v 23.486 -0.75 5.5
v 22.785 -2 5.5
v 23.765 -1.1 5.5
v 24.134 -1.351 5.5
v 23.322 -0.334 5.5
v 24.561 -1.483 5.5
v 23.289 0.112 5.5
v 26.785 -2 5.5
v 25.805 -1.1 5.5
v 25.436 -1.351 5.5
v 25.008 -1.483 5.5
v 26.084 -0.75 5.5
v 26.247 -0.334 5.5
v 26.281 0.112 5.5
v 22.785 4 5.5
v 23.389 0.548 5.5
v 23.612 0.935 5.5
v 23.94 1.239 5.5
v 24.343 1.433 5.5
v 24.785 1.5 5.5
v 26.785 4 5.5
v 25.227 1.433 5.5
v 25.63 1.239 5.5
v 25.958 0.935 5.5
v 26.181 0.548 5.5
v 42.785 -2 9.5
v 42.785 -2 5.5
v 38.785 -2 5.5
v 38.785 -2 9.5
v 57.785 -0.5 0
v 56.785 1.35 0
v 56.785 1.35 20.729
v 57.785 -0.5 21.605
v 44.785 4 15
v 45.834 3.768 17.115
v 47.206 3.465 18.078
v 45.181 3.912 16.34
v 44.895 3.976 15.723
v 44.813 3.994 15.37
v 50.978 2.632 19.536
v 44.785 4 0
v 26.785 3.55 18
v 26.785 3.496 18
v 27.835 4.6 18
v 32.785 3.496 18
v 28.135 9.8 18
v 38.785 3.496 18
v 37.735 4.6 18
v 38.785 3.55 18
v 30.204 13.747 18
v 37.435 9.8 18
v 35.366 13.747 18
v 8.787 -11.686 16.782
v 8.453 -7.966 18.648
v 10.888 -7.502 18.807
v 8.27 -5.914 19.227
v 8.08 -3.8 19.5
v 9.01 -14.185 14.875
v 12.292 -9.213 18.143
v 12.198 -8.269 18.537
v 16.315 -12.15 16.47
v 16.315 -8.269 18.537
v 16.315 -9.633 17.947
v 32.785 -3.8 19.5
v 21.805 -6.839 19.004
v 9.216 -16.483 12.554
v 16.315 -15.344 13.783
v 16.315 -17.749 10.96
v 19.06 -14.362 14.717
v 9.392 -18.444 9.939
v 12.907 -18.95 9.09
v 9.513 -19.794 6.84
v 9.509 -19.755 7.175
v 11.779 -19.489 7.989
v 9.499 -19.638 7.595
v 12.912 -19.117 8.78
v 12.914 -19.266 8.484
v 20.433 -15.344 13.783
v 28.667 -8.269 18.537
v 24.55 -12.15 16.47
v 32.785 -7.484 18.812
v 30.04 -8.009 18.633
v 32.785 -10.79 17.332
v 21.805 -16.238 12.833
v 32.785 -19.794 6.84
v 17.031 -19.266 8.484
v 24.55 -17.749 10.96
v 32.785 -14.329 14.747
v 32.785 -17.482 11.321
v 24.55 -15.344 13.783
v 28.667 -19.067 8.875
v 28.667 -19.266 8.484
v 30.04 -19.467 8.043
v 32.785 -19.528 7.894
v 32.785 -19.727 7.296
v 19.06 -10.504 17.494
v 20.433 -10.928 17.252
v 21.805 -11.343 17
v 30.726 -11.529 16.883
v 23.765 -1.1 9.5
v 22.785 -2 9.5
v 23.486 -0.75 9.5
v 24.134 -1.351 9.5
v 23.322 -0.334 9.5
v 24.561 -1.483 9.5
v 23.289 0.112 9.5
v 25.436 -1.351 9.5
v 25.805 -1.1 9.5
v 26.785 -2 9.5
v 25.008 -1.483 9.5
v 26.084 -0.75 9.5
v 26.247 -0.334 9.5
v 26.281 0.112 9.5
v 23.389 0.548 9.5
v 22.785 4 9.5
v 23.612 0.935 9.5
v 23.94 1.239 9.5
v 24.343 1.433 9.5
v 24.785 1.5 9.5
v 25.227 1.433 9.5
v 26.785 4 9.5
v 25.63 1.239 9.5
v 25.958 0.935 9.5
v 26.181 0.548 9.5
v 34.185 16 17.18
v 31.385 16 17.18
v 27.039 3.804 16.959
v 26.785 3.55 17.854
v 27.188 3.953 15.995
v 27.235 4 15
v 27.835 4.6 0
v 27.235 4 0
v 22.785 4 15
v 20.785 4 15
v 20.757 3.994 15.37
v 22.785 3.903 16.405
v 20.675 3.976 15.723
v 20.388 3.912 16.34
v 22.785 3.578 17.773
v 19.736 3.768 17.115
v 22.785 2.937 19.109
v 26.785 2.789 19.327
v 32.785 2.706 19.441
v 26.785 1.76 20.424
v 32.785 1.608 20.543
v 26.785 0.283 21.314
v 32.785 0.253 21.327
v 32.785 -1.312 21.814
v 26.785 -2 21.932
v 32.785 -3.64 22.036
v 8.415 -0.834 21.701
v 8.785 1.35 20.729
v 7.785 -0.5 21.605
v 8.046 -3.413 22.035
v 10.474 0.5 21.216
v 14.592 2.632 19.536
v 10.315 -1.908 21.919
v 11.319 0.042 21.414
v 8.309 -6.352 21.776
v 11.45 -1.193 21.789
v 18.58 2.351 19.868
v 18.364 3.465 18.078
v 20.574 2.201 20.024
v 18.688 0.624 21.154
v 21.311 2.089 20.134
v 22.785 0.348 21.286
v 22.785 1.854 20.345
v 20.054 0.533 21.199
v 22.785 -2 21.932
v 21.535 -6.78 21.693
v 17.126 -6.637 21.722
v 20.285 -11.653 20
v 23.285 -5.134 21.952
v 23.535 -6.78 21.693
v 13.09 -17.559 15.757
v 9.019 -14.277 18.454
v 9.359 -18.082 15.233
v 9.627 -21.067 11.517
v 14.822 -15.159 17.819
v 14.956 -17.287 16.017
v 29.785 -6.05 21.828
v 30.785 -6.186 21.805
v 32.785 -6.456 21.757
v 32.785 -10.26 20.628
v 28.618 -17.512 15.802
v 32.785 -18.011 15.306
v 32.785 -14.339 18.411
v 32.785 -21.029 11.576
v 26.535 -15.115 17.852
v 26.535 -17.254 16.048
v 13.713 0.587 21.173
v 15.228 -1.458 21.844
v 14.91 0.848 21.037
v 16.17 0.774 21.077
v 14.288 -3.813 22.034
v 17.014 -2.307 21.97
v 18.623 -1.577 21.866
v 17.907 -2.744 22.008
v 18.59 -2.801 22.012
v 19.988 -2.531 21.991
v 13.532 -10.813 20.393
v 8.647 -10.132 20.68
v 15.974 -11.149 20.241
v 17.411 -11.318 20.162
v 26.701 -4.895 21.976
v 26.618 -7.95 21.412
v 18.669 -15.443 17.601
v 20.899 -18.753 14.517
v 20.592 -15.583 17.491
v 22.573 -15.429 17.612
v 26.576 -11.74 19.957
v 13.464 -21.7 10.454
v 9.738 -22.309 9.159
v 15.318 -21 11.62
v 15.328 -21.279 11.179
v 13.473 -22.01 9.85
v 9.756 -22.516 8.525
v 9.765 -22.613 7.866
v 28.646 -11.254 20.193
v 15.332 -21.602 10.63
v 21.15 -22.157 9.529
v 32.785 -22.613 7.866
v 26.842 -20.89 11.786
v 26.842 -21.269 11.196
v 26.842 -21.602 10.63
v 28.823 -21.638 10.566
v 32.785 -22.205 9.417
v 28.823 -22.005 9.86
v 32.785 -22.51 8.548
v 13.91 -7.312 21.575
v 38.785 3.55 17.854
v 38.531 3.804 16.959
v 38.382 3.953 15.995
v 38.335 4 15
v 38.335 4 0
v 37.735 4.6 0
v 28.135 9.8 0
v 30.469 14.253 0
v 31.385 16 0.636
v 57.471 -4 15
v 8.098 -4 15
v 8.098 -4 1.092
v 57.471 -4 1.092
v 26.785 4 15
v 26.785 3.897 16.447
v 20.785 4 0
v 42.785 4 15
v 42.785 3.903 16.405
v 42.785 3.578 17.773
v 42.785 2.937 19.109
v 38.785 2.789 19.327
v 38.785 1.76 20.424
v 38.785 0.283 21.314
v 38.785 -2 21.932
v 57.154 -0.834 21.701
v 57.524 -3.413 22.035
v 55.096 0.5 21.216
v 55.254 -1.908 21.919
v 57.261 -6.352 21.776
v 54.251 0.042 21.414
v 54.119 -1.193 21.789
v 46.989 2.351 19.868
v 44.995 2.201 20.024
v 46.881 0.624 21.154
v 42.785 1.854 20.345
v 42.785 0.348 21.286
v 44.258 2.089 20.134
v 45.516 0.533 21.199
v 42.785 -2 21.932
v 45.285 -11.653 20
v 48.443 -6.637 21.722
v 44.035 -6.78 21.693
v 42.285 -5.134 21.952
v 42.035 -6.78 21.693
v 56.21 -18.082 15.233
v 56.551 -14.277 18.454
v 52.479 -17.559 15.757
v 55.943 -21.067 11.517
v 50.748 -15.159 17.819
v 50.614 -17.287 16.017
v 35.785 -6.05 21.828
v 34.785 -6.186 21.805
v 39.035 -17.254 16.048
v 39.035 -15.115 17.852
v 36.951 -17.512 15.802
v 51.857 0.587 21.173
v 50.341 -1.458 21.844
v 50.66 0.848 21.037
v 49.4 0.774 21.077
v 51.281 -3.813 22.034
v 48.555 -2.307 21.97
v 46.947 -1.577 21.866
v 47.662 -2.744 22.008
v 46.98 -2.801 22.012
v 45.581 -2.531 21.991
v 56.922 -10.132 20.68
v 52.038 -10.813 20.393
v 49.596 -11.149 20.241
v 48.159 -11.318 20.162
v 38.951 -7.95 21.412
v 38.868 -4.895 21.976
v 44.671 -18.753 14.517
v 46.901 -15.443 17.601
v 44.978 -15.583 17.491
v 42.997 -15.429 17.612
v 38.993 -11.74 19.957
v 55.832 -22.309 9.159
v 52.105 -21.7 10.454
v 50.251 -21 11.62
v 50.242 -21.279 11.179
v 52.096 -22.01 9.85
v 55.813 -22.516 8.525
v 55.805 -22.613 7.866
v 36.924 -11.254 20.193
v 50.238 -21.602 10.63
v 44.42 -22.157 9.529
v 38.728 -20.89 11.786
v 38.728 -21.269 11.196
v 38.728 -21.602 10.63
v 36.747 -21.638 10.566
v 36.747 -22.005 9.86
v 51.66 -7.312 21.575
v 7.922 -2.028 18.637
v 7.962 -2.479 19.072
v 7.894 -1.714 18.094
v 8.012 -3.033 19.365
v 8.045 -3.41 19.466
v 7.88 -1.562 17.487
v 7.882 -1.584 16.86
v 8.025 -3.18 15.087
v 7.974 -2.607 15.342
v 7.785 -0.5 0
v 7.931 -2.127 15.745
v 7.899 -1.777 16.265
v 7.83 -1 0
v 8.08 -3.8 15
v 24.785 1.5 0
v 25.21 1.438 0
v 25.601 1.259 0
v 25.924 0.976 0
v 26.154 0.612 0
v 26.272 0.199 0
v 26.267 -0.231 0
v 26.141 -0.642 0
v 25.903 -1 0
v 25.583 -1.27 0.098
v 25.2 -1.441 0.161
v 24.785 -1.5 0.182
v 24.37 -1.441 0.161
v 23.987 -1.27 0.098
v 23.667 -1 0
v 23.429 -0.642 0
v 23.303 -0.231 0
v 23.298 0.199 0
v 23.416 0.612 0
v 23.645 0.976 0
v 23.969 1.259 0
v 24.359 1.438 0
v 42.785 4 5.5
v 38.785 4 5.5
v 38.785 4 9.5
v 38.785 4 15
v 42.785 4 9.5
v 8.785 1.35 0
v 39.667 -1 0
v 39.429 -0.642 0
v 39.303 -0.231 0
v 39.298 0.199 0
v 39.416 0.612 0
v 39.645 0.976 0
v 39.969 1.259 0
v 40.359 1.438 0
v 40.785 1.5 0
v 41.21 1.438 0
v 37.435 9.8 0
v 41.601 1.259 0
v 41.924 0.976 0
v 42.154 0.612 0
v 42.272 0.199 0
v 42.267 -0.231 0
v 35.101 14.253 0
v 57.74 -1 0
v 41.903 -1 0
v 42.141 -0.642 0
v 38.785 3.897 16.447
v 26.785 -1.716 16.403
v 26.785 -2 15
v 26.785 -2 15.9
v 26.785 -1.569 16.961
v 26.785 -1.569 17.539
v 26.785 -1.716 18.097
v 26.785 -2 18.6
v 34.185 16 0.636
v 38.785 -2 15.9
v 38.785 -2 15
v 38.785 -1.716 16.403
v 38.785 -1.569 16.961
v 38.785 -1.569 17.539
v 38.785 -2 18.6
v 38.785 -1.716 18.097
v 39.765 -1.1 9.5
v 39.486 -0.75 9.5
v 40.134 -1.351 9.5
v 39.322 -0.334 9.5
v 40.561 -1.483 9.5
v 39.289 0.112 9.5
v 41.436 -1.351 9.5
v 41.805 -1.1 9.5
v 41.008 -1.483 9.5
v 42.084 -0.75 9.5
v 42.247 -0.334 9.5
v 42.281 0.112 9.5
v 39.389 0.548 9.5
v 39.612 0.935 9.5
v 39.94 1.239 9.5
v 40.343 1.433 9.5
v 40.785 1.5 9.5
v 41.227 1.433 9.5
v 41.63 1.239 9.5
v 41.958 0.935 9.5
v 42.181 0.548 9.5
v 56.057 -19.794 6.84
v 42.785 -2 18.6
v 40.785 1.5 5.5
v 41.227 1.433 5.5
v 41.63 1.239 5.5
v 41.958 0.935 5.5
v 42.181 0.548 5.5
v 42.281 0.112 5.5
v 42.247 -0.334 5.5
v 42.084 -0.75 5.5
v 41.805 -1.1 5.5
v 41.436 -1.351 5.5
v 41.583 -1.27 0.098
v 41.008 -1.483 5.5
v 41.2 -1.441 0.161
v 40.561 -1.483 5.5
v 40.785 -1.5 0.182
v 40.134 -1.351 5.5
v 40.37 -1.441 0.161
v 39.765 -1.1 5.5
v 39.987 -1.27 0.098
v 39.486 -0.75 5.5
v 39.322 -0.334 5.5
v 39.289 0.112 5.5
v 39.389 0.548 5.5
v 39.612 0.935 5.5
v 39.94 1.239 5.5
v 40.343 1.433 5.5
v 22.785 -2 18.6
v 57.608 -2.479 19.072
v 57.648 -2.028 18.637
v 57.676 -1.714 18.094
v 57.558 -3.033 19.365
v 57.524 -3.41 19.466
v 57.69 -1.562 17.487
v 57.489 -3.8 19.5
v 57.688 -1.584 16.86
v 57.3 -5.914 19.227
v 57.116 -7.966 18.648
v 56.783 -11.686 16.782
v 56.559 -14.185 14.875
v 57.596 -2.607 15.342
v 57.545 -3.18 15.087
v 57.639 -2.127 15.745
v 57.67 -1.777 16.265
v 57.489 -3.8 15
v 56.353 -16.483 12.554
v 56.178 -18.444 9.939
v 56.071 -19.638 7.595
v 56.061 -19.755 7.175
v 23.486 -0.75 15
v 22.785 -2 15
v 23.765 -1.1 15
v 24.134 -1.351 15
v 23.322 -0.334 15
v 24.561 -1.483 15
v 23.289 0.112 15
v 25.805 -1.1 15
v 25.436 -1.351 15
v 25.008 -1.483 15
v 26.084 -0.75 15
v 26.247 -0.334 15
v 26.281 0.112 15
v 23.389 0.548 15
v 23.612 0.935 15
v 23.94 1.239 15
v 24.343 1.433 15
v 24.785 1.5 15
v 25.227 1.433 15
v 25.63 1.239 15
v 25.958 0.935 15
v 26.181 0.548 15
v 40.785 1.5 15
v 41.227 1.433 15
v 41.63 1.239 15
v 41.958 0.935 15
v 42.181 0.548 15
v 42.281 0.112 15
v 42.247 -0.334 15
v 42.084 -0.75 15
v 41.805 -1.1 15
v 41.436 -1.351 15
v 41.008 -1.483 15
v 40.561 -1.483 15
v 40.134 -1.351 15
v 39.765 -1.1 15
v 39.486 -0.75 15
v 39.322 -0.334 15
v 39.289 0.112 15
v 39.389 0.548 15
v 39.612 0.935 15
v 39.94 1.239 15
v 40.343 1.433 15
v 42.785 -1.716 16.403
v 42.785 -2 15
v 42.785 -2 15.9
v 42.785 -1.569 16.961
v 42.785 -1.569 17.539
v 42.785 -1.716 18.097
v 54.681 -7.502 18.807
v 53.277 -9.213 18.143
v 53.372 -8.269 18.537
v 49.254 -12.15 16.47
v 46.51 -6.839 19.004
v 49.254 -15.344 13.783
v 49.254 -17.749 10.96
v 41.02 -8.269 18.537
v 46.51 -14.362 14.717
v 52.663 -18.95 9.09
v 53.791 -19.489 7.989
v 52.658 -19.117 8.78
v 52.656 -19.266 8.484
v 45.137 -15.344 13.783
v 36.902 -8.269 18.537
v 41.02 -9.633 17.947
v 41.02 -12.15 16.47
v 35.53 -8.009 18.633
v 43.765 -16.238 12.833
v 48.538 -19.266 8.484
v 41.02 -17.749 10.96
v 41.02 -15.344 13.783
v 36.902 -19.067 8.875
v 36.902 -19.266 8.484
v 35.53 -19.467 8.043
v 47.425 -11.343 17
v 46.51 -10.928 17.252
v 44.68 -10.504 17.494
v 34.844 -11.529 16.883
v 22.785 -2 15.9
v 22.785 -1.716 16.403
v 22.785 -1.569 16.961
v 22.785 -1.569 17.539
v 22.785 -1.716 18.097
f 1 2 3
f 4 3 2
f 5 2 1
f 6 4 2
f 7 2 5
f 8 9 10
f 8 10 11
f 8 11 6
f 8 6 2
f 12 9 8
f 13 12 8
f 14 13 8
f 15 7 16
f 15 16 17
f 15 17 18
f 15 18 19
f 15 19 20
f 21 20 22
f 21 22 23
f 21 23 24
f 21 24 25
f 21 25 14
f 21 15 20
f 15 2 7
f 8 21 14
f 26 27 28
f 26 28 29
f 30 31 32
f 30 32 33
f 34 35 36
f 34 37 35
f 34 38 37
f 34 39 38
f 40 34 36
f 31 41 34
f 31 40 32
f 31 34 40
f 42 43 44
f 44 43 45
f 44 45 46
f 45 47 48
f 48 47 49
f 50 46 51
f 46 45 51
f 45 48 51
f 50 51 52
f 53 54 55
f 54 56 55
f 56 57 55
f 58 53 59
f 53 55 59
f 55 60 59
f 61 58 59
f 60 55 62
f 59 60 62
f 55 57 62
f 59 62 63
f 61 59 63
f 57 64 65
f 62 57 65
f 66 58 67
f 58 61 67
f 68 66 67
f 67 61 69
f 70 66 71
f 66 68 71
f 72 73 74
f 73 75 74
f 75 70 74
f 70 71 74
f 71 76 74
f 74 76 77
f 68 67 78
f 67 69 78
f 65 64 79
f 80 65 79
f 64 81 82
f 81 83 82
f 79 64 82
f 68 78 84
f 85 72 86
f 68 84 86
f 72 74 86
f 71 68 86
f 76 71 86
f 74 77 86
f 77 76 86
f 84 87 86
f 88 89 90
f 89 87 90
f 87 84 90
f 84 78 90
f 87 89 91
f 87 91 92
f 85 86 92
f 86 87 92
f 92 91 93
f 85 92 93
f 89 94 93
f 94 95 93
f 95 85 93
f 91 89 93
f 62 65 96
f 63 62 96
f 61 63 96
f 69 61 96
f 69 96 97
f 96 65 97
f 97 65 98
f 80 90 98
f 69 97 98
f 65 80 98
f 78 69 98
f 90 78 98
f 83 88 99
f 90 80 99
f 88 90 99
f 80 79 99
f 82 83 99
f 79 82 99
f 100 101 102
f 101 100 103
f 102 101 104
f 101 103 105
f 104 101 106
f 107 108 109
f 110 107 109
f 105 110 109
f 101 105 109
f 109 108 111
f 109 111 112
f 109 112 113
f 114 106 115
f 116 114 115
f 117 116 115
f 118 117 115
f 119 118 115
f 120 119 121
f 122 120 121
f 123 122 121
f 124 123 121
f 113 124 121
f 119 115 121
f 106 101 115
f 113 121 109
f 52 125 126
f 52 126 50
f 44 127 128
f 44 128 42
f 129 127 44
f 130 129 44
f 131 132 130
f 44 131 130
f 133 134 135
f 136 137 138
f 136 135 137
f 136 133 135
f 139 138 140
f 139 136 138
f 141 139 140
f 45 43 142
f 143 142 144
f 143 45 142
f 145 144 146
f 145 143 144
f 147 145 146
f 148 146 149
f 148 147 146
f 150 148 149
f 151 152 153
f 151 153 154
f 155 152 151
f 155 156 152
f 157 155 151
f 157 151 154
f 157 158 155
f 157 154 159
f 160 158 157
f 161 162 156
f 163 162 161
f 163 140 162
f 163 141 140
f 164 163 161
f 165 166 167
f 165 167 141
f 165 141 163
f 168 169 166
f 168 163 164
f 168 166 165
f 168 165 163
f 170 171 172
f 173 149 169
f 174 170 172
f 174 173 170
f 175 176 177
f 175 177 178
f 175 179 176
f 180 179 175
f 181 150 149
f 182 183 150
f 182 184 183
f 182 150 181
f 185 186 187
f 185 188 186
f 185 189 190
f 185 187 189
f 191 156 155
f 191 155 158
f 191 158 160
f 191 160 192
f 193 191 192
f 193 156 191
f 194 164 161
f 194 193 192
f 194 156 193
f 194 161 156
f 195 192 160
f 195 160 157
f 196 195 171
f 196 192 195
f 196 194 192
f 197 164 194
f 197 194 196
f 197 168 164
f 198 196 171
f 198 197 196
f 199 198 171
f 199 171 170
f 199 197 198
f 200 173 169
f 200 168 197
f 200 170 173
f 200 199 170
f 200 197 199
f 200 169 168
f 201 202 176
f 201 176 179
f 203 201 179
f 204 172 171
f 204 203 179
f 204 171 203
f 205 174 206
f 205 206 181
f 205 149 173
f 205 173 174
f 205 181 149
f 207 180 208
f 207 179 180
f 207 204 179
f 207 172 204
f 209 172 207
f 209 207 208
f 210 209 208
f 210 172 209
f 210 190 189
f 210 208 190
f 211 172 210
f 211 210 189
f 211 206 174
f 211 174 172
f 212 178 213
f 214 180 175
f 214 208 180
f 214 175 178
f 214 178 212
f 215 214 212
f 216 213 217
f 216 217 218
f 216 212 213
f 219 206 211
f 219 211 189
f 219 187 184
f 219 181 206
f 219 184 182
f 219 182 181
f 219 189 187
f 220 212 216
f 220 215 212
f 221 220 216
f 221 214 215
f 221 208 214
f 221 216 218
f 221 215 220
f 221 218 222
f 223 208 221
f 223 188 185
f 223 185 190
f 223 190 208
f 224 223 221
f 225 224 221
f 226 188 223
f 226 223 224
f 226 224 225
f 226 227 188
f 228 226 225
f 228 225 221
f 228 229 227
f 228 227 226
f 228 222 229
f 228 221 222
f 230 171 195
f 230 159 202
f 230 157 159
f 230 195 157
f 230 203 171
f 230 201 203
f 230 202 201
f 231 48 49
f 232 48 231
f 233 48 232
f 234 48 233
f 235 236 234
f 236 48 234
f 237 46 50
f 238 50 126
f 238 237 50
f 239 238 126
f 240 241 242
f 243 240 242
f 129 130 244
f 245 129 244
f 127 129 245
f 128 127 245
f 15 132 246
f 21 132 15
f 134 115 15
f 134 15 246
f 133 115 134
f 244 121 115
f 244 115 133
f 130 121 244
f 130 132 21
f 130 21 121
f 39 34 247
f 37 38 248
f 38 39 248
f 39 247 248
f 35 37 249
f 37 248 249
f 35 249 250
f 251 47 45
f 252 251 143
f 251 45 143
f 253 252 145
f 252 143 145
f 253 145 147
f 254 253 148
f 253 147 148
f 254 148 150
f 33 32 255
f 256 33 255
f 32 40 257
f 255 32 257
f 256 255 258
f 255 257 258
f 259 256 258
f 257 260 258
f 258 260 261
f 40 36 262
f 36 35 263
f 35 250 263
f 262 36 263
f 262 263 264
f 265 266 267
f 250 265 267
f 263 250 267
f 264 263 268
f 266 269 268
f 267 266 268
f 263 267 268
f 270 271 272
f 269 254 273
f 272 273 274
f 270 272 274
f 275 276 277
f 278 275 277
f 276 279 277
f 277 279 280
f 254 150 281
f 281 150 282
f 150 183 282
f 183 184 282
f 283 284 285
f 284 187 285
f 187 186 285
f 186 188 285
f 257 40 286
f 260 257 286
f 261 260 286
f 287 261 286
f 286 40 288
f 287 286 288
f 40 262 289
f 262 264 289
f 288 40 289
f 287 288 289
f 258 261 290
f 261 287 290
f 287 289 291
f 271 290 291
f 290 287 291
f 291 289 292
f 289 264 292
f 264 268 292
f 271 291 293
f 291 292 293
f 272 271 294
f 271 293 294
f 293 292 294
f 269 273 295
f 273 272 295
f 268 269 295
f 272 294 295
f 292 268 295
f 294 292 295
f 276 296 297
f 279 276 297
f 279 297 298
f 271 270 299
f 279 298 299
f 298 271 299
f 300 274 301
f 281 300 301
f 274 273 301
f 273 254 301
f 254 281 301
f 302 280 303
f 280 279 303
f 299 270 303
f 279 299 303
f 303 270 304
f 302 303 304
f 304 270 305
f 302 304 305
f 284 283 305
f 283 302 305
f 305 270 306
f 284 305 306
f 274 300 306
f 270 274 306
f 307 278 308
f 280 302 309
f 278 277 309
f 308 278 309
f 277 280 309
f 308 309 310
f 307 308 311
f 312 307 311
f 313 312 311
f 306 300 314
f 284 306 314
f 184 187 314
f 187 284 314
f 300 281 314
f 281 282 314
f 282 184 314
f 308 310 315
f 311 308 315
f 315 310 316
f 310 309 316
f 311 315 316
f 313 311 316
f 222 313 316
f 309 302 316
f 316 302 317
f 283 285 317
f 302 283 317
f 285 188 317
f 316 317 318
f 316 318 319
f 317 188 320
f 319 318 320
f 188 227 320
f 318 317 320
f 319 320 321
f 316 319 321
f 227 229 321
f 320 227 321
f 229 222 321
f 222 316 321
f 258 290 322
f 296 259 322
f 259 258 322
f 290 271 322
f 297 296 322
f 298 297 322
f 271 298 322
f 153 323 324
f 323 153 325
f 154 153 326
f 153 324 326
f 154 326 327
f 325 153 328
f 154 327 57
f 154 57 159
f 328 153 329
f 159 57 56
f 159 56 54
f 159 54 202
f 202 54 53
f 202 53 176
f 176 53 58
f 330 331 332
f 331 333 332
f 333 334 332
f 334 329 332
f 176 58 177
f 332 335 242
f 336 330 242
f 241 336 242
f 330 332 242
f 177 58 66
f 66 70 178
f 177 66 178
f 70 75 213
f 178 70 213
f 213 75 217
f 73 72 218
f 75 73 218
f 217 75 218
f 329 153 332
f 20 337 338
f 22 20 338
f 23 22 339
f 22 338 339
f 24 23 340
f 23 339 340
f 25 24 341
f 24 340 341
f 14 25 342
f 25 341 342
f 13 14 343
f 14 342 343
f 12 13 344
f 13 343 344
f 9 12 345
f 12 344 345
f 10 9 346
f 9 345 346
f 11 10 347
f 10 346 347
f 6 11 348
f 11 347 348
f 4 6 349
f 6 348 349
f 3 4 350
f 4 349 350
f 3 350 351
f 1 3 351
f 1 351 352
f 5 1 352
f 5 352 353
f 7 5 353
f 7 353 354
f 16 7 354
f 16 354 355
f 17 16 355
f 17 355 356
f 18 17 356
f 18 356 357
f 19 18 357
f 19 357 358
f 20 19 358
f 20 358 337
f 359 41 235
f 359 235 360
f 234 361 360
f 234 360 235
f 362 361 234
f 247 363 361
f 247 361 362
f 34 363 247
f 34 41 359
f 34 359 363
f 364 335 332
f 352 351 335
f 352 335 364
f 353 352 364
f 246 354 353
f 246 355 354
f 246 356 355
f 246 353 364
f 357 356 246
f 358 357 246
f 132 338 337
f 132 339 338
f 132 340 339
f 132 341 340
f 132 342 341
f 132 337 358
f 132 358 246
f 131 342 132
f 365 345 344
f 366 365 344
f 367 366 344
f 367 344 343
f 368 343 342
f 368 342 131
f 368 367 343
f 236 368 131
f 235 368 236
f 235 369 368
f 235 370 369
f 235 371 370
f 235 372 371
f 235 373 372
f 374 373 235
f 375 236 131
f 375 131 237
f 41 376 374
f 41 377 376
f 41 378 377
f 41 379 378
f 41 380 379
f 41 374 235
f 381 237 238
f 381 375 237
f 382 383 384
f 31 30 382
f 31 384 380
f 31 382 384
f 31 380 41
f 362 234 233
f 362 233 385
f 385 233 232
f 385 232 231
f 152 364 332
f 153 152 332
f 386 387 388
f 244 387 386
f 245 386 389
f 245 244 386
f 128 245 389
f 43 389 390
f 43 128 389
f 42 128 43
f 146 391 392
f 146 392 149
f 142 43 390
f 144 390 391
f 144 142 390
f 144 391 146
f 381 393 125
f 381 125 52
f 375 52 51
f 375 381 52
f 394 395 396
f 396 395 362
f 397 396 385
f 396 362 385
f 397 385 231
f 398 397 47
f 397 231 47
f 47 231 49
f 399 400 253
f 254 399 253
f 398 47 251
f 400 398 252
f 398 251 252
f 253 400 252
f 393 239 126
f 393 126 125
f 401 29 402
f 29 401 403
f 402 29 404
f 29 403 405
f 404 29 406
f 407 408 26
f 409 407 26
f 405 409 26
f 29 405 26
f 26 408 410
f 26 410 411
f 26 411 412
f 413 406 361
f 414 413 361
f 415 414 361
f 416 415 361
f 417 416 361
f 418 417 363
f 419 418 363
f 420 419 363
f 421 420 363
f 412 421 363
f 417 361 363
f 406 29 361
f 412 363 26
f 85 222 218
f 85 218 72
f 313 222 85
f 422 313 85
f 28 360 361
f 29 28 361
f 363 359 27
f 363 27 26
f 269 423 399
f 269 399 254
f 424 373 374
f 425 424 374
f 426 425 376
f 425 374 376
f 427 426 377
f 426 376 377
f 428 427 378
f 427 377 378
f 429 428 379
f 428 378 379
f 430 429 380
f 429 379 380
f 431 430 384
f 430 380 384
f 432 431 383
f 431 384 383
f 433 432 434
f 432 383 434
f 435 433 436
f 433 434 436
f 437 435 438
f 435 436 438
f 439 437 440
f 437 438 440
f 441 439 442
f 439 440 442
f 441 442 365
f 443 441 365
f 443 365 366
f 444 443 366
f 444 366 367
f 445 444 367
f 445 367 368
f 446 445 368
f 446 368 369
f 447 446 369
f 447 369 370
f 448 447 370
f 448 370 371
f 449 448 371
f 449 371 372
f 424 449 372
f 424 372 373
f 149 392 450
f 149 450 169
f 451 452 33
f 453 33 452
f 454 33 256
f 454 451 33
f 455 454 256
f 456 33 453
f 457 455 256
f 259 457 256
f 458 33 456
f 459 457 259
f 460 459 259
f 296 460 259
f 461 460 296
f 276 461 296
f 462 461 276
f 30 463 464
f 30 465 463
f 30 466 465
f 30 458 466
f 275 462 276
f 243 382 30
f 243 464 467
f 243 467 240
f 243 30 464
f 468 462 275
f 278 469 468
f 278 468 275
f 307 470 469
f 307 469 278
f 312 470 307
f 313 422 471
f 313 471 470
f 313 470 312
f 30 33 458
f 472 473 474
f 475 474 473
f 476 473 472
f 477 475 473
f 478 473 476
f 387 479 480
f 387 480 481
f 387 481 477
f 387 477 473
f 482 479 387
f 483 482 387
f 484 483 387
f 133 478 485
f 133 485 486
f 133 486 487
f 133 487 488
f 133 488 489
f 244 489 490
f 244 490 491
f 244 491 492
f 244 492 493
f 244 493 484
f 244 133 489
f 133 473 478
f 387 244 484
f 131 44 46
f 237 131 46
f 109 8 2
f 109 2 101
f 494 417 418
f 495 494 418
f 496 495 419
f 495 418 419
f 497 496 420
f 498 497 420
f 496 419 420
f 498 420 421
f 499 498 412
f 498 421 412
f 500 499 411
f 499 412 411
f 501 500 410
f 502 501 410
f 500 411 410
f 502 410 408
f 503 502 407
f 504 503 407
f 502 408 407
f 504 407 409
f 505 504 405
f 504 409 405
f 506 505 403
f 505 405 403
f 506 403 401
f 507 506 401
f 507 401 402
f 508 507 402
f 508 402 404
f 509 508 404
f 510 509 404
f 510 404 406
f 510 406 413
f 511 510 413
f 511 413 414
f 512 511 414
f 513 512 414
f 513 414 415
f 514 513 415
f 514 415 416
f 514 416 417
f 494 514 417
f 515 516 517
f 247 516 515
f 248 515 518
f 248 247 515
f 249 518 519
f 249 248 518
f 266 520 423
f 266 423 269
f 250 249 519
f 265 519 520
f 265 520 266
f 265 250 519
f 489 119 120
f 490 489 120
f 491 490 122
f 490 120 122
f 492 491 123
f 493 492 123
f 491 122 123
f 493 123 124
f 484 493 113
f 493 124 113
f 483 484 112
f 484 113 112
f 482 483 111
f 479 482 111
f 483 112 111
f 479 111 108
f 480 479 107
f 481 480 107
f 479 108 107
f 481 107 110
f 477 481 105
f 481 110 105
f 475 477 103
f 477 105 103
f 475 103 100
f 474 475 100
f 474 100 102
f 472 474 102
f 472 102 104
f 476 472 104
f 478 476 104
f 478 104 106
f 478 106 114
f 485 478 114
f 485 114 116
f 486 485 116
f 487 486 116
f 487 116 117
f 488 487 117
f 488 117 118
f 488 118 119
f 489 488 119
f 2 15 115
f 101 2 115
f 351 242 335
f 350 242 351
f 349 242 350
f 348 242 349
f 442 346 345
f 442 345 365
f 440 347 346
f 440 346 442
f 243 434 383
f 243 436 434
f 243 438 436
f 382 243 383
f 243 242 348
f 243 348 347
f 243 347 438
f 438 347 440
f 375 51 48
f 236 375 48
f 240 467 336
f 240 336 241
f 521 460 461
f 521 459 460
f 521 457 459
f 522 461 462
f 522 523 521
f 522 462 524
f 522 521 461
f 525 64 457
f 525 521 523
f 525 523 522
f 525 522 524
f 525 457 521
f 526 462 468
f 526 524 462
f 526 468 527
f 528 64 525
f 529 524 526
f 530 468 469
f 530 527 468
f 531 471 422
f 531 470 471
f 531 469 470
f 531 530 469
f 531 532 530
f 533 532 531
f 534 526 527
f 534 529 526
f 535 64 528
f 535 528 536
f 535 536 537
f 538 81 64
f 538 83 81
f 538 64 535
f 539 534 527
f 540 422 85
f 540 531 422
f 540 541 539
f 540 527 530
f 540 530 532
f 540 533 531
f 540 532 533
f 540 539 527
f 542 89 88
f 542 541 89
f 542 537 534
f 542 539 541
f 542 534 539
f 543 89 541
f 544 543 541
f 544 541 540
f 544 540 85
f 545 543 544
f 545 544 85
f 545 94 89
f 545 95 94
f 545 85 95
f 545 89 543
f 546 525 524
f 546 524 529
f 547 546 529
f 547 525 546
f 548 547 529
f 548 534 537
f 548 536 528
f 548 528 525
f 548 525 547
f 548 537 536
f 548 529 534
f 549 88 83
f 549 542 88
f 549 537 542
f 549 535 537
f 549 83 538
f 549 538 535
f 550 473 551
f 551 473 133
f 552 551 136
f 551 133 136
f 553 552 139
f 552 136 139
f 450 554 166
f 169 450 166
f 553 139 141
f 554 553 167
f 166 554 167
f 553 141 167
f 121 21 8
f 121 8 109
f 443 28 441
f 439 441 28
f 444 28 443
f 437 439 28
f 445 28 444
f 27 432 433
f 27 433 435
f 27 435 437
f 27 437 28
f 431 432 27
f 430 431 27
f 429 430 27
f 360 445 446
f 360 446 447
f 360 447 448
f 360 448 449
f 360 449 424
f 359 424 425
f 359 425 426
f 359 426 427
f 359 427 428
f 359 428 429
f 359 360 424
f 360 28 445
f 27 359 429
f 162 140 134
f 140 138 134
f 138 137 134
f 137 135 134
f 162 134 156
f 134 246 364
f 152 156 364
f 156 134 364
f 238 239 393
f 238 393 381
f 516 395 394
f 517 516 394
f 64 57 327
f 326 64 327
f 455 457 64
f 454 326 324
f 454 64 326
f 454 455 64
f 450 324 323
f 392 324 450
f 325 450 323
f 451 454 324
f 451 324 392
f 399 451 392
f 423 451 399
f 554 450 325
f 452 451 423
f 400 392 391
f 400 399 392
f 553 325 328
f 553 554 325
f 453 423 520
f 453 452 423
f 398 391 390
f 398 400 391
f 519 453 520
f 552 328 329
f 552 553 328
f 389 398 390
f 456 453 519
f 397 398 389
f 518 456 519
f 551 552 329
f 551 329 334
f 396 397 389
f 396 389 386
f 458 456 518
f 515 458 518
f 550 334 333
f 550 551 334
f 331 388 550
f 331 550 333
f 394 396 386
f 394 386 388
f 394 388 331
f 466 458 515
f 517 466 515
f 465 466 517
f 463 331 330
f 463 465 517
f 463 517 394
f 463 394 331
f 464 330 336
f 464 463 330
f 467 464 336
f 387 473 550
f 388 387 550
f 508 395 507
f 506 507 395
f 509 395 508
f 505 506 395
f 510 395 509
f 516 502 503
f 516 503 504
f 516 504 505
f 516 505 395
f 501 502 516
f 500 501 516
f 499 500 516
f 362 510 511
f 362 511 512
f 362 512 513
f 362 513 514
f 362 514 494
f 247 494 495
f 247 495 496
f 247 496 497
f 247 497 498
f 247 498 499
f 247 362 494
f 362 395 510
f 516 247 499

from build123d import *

# Parameters (mm, degrees)
PAD_DEPTH            = 25
PAD001_DEPTH         = 18
SKETCH009_R          = 1.5
POCKET_DEPTH         = 22.037219
SKETCH010_W          = 4
SKETCH010_H          = 4
SKETCH010_W_2        = 10
POCKET001_DEPTH      = 6
POCKET002_DEPTH      = 0.001
POCKET002_DEPTH_BACK = -57.785827


with BuildPart() as part:
    # Sketch006 → Pad (new body, symmetric)
    with BuildSketch(Plane(origin=(32.784826, 3e-06, 0), x_dir=(0, 1, 0), z_dir=(1, 0, 0))):
        with BuildLine():
            Line((4, 0), (4, 15))
            add(Edge.make_bspline(
                [(4, 15), (4, 23.212807), (-14, 23.393326), (-22.61293, 10), (-22.61293, 7.866463)],
                knots=[0, 0, 0, 0, 0.5, 1, 1, 1, 1], degree=3))
            Line((-22.61293, 7.866463), (-19.793852, 6.840403))
            add(Edge.make_bspline(
                [(-3.8, 19.5), (-13.258017, 19), (-19.793852, 8.97394), (-19.793852, 6.840403)],
                knots=[0, 0, 0, 0, 1, 1, 1, 1], degree=3))
            ThreePointArc((-3.8, 19.5), (-1.55, 17.25), (-3.8, 15))
            Line((-3.8, 15), (-4, 15))
            Line((-4, 15), (-4, 1.091911))
            Line((-4, 1.091911), (-1, 0))
            Line((-1, 0), (4, 0))
        make_face()
    extrude(amount=PAD_DEPTH, both=True)

    # Sketch008 (on Face9 of Pad) → Pad001 (join)
    with BuildSketch(Plane(origin=(32.784826, 3e-06, 0), x_dir=(0, 1, 0), z_dir=(0, 0, -1))):
        Polygon((3.05, 6.5), (3.05, -6.5), (4.6, -4.95), (9.8, -4.65), (16, -1.4), (16, 1.4), (9.8, 4.65), (4.6, 4.95), align=None)
    extrude(amount=-PAD001_DEPTH)

    # Sketch009 (on Face5 of Pad001) → Pocket (cut, through all)
    with BuildSketch(Plane(origin=(32.784826, 3e-06, 0), x_dir=(0, 1, 0), z_dir=(0, 0, -1))):
        with Locations((0, -8)):
            Circle(SKETCH009_R)
        with Locations((0, 8)):
            Circle(SKETCH009_R)
        Polygon((-34, -26), (4, -26), (4, -12), (1.35, -24), (-0.5, -25), (-34, -22), align=None)
        Polygon((-34, 26), (4, 26), (4, 12), (1.35, 24), (-0.5, 25), (-34, 22), align=None)
    extrude(amount=-POCKET_DEPTH, mode=Mode.SUBTRACT)

    # Sketch010 (on Face12 of Pocket) → Pocket001 (cut)
    with BuildSketch(Plane(origin=(32.784826, 4.000003, 0), x_dir=(0, 0, 1), z_dir=(0, 1, 0))):
        with Locations((7.5, 8)):
            Rectangle(SKETCH010_W, SKETCH010_H)
        with Locations((7.5, -8)):
            Rectangle(SKETCH010_W, SKETCH010_H)
        with Locations((20, 8)):
            Rectangle(SKETCH010_W_2, SKETCH010_H)
        with Locations((20, -8)):
            Rectangle(SKETCH010_W_2, SKETCH010_H)
    extrude(amount=-POCKET001_DEPTH, mode=Mode.SUBTRACT)

    # Sketch → Pocket002 (cut, two sides)
    with BuildSketch(Plane.YZ) as pocket002_sk:
        Polygon((11, 19), (16.940921, 19), (16.940921, 16.837682), align=None)
        Polygon((12.734107, -0.552658), (17, -0.552658), (17, 1), align=None)
    extrude(amount=-POCKET002_DEPTH, mode=Mode.SUBTRACT)
    extrude(pocket002_sk.sketch, amount=-POCKET002_DEPTH_BACK, mode=Mode.SUBTRACT)


solid = part.part
